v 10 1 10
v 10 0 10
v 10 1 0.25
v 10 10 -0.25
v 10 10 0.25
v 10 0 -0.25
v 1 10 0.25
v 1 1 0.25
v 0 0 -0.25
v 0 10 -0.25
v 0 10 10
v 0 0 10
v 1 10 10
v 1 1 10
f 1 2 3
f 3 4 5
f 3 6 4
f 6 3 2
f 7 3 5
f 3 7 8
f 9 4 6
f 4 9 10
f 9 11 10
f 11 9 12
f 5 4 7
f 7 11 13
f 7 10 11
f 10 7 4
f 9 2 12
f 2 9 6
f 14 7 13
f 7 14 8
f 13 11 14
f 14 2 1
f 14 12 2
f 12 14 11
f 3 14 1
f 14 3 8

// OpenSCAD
module makeRoom(cube_size) {
    translate([cube_size / 2, cube_size / 2, 0])
    cube([cube_size, cube_size, 0.5], center = true);
    cube([1, cube_size, cube_size]);
    cube([cube_size, 1, cube_size]);
}
makeRoom(10);
